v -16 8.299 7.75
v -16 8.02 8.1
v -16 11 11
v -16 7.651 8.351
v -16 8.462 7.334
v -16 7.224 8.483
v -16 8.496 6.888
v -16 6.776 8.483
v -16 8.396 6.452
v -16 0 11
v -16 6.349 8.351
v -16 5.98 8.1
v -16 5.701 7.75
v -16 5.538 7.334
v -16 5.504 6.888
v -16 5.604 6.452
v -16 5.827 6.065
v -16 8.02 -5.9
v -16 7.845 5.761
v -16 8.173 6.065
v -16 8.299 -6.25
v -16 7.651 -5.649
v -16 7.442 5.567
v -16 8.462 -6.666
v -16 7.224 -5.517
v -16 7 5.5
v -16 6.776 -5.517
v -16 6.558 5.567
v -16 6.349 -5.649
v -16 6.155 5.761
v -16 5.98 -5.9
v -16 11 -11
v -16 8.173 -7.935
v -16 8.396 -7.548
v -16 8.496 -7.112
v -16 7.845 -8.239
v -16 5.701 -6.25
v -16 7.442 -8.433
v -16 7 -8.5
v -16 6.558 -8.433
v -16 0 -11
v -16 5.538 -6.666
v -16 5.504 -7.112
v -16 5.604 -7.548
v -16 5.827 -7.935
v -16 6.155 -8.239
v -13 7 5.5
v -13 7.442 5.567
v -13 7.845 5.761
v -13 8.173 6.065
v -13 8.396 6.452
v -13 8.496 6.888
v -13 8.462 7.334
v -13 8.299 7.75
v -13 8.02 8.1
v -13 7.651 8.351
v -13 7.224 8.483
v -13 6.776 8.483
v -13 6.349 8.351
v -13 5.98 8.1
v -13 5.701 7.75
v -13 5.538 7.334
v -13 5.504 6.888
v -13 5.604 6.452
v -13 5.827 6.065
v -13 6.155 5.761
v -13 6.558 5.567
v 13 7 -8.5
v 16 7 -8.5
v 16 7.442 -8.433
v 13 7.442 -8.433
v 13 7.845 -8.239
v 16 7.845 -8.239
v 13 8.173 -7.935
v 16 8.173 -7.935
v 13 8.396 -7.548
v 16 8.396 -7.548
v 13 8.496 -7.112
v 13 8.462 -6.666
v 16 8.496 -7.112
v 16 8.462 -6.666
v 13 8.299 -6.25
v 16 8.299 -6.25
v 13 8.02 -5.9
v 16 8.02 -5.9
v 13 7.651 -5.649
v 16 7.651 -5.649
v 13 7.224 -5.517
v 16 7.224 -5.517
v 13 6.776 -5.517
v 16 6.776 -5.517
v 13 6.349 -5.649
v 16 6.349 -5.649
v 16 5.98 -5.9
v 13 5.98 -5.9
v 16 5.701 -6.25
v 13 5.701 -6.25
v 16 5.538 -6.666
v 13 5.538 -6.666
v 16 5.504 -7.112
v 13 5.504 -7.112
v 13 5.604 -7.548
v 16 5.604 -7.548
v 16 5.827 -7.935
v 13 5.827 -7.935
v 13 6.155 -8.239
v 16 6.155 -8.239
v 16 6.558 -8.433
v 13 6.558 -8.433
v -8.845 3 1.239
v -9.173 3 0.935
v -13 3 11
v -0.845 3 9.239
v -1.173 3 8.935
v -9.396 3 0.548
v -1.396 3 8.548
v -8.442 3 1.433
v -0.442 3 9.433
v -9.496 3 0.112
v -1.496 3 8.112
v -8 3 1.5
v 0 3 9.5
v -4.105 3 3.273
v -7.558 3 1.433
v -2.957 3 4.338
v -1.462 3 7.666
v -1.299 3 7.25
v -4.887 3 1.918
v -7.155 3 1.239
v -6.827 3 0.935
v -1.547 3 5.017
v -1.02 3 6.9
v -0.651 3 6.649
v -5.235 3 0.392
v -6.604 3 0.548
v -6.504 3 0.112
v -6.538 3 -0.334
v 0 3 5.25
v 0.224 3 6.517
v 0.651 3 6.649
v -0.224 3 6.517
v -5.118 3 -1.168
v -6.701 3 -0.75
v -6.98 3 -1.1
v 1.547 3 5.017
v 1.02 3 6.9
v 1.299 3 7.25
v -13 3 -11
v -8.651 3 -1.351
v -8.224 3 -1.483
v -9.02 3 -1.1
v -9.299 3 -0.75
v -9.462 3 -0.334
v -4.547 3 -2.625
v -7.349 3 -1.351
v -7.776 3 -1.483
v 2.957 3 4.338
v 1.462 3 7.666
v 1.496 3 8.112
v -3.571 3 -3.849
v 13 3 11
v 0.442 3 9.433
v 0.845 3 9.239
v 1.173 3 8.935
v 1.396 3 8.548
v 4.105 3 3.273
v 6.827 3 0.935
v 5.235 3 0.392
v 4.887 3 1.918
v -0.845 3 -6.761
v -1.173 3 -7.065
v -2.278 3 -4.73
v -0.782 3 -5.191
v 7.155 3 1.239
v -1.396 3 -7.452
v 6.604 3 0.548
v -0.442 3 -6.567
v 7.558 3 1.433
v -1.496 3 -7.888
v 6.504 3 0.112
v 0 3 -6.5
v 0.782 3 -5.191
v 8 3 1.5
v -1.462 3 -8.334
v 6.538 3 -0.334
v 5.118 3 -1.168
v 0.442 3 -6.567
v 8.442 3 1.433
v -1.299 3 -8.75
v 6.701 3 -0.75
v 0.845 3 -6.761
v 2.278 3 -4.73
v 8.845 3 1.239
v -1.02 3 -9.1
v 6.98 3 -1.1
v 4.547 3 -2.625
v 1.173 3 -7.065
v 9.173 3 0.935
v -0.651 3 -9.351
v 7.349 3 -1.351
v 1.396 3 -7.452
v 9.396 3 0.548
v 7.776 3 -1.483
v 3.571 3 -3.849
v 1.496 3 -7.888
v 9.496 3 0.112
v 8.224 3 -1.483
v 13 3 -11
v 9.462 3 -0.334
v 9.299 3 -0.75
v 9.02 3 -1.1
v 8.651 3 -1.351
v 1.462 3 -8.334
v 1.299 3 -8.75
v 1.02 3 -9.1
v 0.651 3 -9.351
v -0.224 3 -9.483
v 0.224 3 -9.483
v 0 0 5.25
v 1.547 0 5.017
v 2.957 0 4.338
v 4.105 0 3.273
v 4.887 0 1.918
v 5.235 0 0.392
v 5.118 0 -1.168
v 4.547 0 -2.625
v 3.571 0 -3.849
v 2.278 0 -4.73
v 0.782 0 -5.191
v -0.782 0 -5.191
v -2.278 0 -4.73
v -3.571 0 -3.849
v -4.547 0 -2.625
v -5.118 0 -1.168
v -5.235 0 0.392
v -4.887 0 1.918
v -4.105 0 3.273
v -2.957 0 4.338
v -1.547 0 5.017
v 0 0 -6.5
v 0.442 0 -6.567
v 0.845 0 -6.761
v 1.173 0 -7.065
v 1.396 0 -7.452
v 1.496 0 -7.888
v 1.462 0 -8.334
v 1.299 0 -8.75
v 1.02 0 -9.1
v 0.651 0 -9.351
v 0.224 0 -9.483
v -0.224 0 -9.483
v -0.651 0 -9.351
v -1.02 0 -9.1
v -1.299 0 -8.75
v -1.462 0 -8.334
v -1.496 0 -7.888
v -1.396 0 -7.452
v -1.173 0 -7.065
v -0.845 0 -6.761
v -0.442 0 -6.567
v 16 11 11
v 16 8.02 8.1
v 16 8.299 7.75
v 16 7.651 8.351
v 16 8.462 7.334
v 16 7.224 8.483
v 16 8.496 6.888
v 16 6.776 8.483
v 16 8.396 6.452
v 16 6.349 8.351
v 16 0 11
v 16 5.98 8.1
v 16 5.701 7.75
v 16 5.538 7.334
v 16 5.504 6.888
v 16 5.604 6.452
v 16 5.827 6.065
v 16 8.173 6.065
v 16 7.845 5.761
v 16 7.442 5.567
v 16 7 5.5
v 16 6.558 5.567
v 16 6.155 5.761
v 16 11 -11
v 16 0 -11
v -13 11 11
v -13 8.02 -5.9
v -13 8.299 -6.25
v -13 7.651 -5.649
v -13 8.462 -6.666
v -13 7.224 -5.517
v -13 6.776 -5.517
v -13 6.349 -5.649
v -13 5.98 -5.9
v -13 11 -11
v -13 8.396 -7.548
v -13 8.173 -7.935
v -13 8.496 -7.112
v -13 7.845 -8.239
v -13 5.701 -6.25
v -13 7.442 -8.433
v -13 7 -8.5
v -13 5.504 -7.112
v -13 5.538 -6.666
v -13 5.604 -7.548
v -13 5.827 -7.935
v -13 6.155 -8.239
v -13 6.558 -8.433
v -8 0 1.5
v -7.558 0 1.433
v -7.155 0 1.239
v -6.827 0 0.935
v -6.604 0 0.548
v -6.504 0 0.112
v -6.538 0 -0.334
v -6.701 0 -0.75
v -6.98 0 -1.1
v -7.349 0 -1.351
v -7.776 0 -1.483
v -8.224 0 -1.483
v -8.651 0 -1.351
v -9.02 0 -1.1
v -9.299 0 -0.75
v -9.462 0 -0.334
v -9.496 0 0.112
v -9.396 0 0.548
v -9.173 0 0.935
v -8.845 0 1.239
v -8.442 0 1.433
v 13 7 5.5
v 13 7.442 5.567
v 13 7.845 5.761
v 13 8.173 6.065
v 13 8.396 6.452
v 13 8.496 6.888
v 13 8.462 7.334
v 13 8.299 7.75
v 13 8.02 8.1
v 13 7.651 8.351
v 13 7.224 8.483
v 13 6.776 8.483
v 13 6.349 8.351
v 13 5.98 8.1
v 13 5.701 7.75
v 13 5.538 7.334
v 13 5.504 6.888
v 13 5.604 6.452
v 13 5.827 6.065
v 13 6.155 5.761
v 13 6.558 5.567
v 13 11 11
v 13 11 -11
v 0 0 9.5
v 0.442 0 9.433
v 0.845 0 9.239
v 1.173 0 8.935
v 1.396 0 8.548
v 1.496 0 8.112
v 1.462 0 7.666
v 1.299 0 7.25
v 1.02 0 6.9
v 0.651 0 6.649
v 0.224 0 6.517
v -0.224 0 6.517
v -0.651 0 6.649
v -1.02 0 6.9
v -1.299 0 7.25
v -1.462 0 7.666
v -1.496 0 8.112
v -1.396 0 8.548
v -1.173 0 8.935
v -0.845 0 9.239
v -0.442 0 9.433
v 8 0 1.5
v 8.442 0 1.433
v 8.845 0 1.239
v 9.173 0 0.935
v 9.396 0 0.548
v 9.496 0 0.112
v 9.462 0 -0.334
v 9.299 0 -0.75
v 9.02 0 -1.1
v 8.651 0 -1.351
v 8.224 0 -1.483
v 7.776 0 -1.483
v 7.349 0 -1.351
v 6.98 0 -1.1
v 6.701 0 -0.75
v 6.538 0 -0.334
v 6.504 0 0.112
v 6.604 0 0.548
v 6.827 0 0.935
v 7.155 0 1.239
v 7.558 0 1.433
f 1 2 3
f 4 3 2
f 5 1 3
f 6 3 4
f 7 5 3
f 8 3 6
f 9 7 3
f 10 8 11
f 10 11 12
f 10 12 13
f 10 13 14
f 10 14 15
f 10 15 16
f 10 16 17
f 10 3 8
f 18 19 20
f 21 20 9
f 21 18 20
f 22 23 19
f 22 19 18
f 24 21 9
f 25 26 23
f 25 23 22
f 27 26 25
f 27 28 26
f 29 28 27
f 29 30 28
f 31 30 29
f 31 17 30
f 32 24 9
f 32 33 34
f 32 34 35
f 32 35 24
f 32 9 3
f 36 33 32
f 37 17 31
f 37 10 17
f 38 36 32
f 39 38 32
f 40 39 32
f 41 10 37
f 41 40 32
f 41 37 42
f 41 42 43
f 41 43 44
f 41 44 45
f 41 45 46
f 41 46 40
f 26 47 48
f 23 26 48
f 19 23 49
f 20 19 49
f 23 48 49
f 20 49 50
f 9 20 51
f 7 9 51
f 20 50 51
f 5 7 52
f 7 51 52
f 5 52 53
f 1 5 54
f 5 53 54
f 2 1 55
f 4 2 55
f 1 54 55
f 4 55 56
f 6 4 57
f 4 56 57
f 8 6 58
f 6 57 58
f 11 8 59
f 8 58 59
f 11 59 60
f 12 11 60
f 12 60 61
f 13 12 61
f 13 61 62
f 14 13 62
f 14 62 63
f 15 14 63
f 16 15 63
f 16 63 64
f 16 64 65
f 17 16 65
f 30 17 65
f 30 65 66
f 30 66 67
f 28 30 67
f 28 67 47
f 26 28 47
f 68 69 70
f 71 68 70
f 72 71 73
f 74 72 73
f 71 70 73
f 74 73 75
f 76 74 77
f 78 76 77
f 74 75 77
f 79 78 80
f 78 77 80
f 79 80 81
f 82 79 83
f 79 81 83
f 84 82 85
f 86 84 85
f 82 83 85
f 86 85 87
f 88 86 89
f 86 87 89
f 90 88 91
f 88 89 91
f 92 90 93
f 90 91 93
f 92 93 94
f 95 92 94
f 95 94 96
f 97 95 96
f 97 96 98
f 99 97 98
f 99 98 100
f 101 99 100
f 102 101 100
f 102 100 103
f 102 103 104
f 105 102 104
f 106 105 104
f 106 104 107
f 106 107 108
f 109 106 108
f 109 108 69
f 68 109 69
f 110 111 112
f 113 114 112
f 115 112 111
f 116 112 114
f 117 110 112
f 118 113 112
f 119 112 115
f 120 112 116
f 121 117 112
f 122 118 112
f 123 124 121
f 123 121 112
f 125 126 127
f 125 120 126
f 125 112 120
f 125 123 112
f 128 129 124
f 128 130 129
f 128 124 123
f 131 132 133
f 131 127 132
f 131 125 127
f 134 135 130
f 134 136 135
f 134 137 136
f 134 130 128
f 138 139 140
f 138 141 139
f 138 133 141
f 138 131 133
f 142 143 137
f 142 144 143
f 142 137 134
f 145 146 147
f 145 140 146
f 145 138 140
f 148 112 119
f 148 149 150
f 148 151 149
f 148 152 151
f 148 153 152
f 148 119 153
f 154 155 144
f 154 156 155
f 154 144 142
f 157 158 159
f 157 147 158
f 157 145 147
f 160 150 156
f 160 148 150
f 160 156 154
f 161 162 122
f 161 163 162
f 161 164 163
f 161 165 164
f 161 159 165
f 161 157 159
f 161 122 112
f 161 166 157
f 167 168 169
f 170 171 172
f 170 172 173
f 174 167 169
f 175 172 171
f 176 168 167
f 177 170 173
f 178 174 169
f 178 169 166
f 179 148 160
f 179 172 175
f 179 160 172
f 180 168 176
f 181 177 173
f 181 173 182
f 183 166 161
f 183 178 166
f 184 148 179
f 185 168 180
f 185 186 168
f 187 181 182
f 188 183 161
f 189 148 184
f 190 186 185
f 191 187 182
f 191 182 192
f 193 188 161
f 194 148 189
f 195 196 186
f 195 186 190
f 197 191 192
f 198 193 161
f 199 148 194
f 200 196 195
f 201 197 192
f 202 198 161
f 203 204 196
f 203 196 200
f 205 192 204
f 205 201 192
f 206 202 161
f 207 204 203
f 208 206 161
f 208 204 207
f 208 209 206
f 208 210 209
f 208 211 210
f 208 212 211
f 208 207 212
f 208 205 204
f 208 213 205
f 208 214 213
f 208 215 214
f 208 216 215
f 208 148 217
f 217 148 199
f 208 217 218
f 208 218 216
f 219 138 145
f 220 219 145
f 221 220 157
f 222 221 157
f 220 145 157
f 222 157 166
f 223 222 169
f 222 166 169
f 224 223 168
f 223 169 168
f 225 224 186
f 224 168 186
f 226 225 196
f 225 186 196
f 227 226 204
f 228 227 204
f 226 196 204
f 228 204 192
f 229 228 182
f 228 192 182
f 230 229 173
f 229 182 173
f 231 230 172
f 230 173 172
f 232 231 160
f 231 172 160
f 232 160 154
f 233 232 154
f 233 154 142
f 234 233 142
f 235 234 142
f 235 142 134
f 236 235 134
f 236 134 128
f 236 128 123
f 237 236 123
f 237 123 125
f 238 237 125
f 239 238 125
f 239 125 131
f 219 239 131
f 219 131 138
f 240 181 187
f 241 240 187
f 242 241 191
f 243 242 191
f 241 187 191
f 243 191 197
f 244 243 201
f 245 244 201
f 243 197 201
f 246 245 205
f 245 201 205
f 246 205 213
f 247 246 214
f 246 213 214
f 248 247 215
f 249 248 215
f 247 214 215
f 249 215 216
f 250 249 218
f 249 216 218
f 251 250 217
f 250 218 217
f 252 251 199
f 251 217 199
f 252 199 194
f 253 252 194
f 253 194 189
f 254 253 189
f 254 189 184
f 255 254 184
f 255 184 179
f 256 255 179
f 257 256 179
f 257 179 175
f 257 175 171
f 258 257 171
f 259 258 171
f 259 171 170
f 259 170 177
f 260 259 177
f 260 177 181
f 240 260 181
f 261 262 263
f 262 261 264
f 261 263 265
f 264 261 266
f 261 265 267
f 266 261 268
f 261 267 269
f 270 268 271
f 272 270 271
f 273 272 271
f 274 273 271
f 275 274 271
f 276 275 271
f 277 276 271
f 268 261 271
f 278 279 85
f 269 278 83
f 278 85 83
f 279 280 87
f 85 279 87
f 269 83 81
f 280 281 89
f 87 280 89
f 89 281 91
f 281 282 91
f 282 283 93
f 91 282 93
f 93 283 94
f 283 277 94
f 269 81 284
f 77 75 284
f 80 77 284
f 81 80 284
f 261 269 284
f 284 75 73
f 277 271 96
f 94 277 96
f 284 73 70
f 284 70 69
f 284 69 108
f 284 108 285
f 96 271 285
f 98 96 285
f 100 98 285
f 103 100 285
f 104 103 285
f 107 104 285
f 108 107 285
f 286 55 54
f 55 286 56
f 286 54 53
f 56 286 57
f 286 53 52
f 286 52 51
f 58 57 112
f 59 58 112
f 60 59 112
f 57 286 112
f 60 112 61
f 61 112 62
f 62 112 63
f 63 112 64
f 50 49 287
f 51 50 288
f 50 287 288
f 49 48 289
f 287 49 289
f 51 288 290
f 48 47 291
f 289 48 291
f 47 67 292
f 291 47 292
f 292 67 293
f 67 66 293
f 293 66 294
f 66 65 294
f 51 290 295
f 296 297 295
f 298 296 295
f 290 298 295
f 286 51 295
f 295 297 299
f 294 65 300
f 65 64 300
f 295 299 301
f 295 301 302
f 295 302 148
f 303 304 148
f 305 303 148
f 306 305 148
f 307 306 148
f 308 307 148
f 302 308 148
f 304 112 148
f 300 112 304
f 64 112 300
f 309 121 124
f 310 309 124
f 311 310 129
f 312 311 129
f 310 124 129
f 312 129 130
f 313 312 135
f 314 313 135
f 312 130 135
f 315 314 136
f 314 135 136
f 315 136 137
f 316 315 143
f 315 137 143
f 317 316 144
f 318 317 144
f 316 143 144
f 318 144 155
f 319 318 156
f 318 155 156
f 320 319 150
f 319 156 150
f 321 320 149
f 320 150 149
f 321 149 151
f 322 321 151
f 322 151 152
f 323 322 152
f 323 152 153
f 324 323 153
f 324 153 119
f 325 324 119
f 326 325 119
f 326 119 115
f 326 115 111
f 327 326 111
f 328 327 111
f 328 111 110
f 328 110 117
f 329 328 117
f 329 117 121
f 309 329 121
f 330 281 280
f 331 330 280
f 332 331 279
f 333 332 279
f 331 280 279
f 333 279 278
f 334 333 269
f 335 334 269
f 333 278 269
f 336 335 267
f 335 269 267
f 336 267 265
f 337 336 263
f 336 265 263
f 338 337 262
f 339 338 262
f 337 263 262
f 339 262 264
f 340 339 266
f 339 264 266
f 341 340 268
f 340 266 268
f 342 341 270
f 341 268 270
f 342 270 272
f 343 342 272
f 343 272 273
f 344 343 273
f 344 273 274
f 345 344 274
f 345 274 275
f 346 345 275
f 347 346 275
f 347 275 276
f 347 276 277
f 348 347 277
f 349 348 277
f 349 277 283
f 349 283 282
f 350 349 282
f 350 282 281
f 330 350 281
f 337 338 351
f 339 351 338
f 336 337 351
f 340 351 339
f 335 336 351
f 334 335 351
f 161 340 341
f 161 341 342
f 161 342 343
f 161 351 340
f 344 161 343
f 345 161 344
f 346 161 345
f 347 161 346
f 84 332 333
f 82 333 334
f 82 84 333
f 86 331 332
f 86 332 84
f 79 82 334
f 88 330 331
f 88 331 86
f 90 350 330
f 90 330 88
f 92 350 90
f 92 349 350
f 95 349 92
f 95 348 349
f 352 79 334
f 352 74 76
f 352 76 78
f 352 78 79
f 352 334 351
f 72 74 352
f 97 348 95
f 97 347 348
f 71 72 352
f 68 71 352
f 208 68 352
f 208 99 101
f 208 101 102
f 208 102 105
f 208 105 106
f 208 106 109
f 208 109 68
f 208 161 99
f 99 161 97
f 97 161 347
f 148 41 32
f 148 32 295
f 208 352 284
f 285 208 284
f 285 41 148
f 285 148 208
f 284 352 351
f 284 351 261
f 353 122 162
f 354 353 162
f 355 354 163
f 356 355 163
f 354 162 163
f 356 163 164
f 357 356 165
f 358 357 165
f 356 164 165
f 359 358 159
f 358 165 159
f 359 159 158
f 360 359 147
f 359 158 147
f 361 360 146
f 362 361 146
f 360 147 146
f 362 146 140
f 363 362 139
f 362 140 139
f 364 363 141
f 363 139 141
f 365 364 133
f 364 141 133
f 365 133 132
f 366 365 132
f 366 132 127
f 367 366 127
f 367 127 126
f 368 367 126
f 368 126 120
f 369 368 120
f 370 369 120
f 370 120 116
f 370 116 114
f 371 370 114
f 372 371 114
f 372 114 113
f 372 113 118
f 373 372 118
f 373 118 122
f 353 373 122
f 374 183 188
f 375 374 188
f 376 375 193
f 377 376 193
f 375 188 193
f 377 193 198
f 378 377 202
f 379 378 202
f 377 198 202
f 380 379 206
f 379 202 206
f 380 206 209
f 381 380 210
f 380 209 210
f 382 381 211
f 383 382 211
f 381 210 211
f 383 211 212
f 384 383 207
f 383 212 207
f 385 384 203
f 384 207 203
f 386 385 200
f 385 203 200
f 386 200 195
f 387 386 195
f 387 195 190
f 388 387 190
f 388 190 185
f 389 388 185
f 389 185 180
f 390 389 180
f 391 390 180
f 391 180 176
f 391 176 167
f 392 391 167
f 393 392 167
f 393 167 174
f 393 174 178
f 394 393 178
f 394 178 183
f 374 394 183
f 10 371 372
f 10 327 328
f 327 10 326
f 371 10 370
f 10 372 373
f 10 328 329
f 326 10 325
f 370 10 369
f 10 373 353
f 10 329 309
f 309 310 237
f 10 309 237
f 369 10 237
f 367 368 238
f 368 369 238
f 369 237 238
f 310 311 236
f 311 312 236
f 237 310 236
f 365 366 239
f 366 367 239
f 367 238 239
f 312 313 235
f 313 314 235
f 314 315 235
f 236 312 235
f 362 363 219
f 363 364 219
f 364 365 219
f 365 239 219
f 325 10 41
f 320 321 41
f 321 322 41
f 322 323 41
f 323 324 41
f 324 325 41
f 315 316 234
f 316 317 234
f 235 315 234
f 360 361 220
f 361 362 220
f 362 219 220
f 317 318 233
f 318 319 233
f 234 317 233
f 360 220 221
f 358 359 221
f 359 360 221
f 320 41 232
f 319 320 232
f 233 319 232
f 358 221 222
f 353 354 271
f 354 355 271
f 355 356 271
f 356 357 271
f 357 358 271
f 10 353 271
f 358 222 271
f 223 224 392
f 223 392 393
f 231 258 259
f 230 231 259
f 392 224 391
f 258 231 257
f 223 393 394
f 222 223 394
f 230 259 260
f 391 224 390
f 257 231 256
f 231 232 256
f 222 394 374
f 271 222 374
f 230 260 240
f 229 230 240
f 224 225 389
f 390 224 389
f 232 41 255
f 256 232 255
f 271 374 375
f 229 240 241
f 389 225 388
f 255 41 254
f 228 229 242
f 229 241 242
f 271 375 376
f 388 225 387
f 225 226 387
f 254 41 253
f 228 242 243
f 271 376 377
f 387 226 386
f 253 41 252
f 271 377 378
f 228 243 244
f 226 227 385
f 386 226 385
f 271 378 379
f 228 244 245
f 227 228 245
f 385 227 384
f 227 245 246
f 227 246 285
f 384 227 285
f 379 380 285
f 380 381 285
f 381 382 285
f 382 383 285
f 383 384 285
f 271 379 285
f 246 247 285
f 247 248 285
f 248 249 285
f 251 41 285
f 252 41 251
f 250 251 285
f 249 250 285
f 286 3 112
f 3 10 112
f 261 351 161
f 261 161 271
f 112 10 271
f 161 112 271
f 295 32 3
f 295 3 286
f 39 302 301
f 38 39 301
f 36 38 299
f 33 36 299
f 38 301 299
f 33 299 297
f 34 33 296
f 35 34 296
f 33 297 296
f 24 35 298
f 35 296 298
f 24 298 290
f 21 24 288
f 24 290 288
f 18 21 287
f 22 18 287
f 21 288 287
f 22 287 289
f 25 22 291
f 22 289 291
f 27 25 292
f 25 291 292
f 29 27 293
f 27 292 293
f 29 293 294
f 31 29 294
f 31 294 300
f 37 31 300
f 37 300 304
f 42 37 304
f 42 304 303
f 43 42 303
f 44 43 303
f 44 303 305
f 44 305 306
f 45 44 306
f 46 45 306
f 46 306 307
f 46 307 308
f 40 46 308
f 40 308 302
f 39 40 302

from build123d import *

# Parameters (mm, degrees)
SKETCH_1_W          = 32
SKETCH_1_H          = 22
EXTRUDE_1_DEPTH     = 3
SKETCH_2_W          = 3
SKETCH_2_H          = 22
EXTRUDE_2_DEPTH     = 8
SKETCH_3_R          = 1.5
CUT_EXTRUDE_1_DEPTH = 36.580893749
SKETCH_4_R          = 5.25
SKETCH_4_R_2        = 1.5
CUT_EXTRUDE_2_DEPTH = 22


with BuildPart() as part:
    # 草图1 → 凸台-拉伸1 (new body)
    with BuildSketch(Plane(origin=(0, 0, 0), x_dir=(1, 0, 0), z_dir=(0, 1, 0))):
        Rectangle(SKETCH_1_W, SKETCH_1_H)
    extrude(amount=EXTRUDE_1_DEPTH)

    # 草图2 → 凸台-拉伸2 (add)
    with BuildSketch(Plane(origin=(0, 3, 0), x_dir=(1, 0, 0), z_dir=(0, 1, 0))):
        with Locations((-14.5, 0)):
            Rectangle(SKETCH_2_W, SKETCH_2_H)
        with Locations((14.5, 0)):
            Rectangle(SKETCH_2_W, SKETCH_2_H)
    extrude(amount=EXTRUDE_2_DEPTH)

    # 草图3 → 切除-拉伸1 (cut, through all)
    with BuildSketch(Plane(origin=(16, 0, 0), x_dir=(0, 0, -1), z_dir=(1, 0, 0))):
        with Locations((-7, 7)):
            Circle(SKETCH_3_R)
        with Locations((7, 7)):
            Circle(SKETCH_3_R)
    extrude(amount=-CUT_EXTRUDE_1_DEPTH, mode=Mode.SUBTRACT)

    # 草图4 → 切除-拉伸2 (cut, through all)
    with BuildSketch(Plane(origin=(0, 3, 0), x_dir=(1, 0, 0), z_dir=(0, 1, 0))):
        with Locations(Location((0, 0, 0), (0, 0, 270))):
            Circle(SKETCH_4_R)
        with Locations(Location((0, 8, 0), (0, 0, 270))):
            Circle(SKETCH_4_R_2)
        with Locations(Location((8, 0, 0), (0, 0, 270))):
            Circle(SKETCH_4_R_2)
        with Locations(Location((0, -8, 0), (0, 0, 270))):
            Circle(SKETCH_4_R_2)
        with Locations(Location((-8, 0, 0), (0, 0, 270))):
            Circle(SKETCH_4_R_2)
    extrude(amount=-CUT_EXTRUDE_2_DEPTH, mode=Mode.SUBTRACT)


solid = part.part
